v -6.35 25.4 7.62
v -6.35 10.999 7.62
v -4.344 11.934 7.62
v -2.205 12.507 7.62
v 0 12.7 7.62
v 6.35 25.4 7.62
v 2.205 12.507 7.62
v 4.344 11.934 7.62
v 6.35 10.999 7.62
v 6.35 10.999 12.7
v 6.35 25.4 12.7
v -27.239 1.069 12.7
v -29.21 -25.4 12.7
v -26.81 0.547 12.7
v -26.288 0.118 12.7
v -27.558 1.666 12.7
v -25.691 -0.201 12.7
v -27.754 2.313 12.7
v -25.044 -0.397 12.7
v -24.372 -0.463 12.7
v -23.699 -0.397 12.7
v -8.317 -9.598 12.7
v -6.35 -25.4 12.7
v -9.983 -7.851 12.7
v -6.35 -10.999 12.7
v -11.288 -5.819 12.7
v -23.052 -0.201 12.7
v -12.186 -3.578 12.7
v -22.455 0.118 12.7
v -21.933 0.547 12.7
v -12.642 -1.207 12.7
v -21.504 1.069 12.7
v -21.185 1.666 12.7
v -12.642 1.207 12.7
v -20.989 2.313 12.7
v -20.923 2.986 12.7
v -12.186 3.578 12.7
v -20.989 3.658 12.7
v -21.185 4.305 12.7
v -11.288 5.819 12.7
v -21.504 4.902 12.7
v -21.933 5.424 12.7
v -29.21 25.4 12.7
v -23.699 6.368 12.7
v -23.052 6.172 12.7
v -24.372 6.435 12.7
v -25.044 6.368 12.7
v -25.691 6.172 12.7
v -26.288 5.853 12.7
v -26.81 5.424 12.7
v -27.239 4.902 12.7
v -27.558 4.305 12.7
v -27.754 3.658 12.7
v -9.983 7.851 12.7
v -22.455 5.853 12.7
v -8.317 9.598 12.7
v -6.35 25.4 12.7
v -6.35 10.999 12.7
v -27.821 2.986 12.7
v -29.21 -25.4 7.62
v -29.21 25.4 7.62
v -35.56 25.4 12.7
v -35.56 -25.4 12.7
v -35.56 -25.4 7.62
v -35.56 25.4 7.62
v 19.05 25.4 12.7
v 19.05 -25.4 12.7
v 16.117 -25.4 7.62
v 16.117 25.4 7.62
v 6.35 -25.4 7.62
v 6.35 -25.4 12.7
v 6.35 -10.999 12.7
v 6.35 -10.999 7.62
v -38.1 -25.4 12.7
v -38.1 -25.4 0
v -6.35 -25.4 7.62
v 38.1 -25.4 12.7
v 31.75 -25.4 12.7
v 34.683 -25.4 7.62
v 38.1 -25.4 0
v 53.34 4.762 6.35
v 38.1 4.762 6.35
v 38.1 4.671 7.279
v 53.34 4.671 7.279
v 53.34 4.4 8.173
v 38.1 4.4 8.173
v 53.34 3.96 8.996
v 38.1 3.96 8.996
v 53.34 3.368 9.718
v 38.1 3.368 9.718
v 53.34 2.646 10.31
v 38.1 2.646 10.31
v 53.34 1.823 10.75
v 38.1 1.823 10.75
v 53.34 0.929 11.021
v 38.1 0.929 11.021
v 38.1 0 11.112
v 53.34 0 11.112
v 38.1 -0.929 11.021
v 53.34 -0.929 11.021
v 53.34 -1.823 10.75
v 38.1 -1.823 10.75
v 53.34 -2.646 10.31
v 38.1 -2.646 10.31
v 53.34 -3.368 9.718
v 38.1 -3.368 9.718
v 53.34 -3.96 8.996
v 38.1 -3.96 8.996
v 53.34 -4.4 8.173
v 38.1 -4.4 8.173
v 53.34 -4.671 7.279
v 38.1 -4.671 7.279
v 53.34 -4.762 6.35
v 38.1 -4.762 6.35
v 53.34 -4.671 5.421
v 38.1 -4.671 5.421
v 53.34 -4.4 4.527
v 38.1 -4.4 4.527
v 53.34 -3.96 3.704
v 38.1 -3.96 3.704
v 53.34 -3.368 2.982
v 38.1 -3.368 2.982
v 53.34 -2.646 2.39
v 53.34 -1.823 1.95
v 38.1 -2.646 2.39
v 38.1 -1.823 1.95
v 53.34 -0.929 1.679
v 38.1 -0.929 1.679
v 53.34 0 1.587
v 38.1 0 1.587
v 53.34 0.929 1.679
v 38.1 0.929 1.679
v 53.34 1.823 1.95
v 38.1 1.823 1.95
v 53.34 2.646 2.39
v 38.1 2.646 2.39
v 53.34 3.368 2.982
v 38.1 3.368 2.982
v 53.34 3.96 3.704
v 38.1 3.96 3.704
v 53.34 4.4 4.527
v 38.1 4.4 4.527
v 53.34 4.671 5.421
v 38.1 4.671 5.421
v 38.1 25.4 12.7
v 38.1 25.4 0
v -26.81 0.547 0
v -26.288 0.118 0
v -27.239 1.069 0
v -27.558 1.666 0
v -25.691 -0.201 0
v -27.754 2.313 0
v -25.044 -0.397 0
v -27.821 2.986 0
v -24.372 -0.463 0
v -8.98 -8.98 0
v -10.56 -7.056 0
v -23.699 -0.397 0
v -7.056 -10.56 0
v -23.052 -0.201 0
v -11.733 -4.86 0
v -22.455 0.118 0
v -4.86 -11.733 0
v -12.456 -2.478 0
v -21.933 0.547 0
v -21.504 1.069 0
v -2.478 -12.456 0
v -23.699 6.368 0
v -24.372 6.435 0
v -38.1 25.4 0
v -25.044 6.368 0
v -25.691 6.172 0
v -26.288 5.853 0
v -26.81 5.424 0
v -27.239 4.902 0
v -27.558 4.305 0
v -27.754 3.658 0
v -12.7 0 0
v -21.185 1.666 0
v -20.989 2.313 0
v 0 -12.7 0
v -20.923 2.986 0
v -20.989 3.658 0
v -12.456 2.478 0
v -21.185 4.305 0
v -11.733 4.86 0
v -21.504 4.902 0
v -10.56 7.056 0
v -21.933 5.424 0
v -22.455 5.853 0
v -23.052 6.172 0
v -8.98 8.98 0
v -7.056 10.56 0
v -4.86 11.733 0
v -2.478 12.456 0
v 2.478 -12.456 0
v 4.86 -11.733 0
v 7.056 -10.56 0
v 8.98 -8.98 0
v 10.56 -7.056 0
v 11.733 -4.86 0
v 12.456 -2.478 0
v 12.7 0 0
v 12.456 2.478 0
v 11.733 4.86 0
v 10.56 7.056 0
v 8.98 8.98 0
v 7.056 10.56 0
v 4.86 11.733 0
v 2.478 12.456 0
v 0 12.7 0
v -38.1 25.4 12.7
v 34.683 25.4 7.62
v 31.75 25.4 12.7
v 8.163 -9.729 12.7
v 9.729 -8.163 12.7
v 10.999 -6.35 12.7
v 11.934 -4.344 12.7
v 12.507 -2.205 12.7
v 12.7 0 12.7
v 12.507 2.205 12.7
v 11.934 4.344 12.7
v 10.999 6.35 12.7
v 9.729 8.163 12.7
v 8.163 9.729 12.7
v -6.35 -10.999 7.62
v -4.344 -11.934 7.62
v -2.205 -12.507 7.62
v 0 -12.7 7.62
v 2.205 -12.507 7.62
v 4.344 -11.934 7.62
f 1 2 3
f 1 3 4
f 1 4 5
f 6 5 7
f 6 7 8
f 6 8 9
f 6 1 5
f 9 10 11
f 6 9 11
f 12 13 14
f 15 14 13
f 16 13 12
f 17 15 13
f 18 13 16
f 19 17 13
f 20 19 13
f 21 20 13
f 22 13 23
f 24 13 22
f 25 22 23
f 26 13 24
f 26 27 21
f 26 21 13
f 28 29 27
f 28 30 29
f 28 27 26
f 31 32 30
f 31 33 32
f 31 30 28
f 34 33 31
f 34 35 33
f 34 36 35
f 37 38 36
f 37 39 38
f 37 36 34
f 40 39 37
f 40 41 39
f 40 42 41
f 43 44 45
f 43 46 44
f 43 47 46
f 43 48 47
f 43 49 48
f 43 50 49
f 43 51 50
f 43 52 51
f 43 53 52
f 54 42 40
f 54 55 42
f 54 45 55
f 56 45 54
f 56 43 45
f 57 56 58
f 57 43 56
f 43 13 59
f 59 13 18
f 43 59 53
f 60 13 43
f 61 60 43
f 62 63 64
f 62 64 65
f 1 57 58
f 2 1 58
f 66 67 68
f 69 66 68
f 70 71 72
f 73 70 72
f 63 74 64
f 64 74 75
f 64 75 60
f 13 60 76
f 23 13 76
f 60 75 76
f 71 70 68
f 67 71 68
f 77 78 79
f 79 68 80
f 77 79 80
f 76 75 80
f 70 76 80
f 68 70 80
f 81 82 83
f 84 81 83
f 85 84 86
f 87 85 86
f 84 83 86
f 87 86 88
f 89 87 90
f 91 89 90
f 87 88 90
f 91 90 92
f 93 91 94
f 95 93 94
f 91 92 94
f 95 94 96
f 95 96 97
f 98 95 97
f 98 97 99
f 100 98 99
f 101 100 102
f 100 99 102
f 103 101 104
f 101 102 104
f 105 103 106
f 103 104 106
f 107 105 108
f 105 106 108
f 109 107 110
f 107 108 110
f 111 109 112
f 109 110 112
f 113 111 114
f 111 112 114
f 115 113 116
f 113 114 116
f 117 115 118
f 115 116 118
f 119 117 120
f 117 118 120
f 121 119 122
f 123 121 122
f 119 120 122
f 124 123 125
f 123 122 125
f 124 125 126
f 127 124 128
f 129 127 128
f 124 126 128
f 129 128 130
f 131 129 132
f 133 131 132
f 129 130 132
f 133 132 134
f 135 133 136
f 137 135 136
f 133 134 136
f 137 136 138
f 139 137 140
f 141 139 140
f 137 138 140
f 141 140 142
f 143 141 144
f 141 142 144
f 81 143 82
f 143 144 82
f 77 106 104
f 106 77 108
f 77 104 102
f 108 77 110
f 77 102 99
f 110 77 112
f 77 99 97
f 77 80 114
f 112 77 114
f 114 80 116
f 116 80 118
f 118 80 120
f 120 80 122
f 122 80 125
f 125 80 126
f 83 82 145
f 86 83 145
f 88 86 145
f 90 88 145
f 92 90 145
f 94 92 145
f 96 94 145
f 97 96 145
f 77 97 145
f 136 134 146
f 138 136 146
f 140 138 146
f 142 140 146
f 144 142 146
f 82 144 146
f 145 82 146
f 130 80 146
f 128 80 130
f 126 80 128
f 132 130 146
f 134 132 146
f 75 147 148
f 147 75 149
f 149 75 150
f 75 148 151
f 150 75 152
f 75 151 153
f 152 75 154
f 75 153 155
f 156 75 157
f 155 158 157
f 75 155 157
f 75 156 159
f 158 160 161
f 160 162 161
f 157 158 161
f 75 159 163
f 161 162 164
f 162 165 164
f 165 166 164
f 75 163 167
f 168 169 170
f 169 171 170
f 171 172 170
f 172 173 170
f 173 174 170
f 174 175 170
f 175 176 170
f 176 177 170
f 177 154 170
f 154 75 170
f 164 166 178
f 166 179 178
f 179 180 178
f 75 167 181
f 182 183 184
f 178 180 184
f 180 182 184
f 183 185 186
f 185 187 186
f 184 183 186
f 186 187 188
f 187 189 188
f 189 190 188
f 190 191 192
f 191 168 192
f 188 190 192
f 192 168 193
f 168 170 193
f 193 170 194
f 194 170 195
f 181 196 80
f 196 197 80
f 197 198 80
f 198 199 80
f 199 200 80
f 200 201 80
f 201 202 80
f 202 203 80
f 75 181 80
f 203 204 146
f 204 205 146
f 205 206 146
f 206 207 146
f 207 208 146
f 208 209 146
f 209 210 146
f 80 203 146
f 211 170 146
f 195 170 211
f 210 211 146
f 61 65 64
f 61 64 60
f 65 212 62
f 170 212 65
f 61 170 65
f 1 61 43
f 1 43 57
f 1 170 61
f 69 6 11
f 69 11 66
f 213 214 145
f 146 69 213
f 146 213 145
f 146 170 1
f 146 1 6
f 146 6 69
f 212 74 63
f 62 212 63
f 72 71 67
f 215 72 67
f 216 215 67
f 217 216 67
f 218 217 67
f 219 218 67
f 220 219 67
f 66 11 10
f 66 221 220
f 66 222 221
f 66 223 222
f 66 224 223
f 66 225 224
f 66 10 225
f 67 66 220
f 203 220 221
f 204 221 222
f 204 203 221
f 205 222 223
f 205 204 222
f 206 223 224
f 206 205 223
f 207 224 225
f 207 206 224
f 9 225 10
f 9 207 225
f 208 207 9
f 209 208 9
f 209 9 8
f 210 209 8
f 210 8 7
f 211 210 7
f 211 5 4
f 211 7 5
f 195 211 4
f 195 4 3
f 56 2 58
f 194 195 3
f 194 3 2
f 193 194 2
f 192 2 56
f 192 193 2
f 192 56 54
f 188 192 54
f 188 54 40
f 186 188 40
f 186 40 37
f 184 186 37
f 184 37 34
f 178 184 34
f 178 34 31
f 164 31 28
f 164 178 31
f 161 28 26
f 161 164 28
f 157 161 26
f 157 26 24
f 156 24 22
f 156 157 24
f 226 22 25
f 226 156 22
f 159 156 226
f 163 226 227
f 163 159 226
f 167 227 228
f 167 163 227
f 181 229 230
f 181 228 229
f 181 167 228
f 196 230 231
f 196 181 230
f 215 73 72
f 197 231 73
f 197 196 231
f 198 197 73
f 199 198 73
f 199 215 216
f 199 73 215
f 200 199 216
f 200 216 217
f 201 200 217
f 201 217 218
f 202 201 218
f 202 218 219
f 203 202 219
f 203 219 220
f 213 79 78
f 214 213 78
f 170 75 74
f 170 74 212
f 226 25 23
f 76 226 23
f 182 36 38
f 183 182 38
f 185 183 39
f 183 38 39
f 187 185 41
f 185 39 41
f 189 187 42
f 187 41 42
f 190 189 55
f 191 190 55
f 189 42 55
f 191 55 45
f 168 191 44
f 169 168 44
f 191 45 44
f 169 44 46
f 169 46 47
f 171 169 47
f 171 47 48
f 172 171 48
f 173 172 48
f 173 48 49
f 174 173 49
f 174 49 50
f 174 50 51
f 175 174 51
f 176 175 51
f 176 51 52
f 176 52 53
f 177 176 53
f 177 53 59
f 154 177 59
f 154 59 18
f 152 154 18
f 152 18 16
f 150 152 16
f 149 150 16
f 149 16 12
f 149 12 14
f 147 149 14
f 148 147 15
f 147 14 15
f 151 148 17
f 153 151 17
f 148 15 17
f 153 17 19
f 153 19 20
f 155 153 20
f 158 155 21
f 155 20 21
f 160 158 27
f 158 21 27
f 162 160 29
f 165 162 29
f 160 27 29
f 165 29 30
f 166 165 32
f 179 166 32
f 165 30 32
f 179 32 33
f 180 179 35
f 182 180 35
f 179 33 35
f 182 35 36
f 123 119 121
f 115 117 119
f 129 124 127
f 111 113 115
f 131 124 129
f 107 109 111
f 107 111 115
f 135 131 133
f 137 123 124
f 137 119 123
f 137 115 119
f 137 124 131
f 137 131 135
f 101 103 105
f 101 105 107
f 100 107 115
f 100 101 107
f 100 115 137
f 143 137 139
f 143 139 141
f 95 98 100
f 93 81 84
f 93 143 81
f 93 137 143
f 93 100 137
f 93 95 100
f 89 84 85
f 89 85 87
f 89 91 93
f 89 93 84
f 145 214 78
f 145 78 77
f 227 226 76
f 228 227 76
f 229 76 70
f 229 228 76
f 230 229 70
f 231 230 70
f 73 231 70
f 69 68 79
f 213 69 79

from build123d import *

# Parameters (mm, degrees)
F0_W      = 76.2
F0_H      = 50.8
F0_R      = 12.7
F1_DEPTH  = 12.7
F2_W      = 6.35
F2_H      = 50.8
F3_DEPTH  = 5.08
F5_DEPTH  = 50.801
F6_R      = 4.7625
F7_DEPTH  = 15.24
F8_R      = 3.4489881571
F9_DEPTH  = 12.701
F10_R     = 4.2111787038
F11_DEPTH = 113


# Not quite as in the source:
# - an extrude ends at something that could not be found from the text; its depth is read off the source's solid


with BuildPart() as f1:
    # F0 (on Top) → F1 (new body)
    with BuildSketch(Plane.XY):
        Rectangle(F0_W, F0_H)
        Circle(F0_R, mode=Mode.SUBTRACT)
    extrude(amount=F1_DEPTH)

    # F2 (on face) → F3 (cut)
    with BuildSketch(Plane.XY.offset(12.7)):
        with Locations((-32.385, 0)):
            Rectangle(F2_W, F2_H)
        with BuildLine():
            Line((6.35, 25.4), (-6.35, 25.4))
            Line((-6.35, 25.4), (-6.35, 10.9985226281))
            ThreePointArc((-6.35, 10.9985226281), (0, 12.7), (6.35, 10.9985226281))
            Line((6.35, 10.9985226281), (6.35, 25.4))
        make_face()
        with BuildLine():
            Line((-6.35, -10.9985226281), (-6.35, -25.4))
            Line((-6.35, -25.4), (6.35, -25.4))
            Line((6.35, -25.4), (6.35, -10.9985226281))
            ThreePointArc((6.35, -10.9985226281), (0, -12.7), (-6.35, -10.9985226281))
        make_face()
    extrude(amount=-F3_DEPTH, mode=Mode.SUBTRACT)

    # F4 (on face) → F5 (cut, through all)
    with BuildSketch(Plane.XZ.offset(25.4)):
        Polygon((31.75, 12.7), (19.05, 12.7), (16.1170606325, 7.62), (34.6829393675, 7.62), align=None)
    extrude(amount=-F5_DEPTH, mode=Mode.SUBTRACT)

    # F6 (on face) → F7 (join)
    with BuildSketch(Plane.YZ.offset(38.1)):
        with Locations((0, 6.35)):
            Circle(F6_R)
    extrude(amount=F7_DEPTH)

    # F8 (on face) → F9 (cut, through all)
    with BuildSketch(Plane.XY.offset(12.7)):
        with Locations((-24.371592328, 2.9855815228)):
            Circle(F8_R)
    extrude(amount=-F9_DEPTH, mode=Mode.SUBTRACT)

    # F10 (on face) → F11 (cut, through all)
    with BuildSketch(Plane.XY.offset(12.7)):
        with Locations((-20.9910459816, -11.7274438962)):
            Circle(F10_R)
    extrude(amount=F11_DEPTH, mode=Mode.SUBTRACT)


solid = f1.part
